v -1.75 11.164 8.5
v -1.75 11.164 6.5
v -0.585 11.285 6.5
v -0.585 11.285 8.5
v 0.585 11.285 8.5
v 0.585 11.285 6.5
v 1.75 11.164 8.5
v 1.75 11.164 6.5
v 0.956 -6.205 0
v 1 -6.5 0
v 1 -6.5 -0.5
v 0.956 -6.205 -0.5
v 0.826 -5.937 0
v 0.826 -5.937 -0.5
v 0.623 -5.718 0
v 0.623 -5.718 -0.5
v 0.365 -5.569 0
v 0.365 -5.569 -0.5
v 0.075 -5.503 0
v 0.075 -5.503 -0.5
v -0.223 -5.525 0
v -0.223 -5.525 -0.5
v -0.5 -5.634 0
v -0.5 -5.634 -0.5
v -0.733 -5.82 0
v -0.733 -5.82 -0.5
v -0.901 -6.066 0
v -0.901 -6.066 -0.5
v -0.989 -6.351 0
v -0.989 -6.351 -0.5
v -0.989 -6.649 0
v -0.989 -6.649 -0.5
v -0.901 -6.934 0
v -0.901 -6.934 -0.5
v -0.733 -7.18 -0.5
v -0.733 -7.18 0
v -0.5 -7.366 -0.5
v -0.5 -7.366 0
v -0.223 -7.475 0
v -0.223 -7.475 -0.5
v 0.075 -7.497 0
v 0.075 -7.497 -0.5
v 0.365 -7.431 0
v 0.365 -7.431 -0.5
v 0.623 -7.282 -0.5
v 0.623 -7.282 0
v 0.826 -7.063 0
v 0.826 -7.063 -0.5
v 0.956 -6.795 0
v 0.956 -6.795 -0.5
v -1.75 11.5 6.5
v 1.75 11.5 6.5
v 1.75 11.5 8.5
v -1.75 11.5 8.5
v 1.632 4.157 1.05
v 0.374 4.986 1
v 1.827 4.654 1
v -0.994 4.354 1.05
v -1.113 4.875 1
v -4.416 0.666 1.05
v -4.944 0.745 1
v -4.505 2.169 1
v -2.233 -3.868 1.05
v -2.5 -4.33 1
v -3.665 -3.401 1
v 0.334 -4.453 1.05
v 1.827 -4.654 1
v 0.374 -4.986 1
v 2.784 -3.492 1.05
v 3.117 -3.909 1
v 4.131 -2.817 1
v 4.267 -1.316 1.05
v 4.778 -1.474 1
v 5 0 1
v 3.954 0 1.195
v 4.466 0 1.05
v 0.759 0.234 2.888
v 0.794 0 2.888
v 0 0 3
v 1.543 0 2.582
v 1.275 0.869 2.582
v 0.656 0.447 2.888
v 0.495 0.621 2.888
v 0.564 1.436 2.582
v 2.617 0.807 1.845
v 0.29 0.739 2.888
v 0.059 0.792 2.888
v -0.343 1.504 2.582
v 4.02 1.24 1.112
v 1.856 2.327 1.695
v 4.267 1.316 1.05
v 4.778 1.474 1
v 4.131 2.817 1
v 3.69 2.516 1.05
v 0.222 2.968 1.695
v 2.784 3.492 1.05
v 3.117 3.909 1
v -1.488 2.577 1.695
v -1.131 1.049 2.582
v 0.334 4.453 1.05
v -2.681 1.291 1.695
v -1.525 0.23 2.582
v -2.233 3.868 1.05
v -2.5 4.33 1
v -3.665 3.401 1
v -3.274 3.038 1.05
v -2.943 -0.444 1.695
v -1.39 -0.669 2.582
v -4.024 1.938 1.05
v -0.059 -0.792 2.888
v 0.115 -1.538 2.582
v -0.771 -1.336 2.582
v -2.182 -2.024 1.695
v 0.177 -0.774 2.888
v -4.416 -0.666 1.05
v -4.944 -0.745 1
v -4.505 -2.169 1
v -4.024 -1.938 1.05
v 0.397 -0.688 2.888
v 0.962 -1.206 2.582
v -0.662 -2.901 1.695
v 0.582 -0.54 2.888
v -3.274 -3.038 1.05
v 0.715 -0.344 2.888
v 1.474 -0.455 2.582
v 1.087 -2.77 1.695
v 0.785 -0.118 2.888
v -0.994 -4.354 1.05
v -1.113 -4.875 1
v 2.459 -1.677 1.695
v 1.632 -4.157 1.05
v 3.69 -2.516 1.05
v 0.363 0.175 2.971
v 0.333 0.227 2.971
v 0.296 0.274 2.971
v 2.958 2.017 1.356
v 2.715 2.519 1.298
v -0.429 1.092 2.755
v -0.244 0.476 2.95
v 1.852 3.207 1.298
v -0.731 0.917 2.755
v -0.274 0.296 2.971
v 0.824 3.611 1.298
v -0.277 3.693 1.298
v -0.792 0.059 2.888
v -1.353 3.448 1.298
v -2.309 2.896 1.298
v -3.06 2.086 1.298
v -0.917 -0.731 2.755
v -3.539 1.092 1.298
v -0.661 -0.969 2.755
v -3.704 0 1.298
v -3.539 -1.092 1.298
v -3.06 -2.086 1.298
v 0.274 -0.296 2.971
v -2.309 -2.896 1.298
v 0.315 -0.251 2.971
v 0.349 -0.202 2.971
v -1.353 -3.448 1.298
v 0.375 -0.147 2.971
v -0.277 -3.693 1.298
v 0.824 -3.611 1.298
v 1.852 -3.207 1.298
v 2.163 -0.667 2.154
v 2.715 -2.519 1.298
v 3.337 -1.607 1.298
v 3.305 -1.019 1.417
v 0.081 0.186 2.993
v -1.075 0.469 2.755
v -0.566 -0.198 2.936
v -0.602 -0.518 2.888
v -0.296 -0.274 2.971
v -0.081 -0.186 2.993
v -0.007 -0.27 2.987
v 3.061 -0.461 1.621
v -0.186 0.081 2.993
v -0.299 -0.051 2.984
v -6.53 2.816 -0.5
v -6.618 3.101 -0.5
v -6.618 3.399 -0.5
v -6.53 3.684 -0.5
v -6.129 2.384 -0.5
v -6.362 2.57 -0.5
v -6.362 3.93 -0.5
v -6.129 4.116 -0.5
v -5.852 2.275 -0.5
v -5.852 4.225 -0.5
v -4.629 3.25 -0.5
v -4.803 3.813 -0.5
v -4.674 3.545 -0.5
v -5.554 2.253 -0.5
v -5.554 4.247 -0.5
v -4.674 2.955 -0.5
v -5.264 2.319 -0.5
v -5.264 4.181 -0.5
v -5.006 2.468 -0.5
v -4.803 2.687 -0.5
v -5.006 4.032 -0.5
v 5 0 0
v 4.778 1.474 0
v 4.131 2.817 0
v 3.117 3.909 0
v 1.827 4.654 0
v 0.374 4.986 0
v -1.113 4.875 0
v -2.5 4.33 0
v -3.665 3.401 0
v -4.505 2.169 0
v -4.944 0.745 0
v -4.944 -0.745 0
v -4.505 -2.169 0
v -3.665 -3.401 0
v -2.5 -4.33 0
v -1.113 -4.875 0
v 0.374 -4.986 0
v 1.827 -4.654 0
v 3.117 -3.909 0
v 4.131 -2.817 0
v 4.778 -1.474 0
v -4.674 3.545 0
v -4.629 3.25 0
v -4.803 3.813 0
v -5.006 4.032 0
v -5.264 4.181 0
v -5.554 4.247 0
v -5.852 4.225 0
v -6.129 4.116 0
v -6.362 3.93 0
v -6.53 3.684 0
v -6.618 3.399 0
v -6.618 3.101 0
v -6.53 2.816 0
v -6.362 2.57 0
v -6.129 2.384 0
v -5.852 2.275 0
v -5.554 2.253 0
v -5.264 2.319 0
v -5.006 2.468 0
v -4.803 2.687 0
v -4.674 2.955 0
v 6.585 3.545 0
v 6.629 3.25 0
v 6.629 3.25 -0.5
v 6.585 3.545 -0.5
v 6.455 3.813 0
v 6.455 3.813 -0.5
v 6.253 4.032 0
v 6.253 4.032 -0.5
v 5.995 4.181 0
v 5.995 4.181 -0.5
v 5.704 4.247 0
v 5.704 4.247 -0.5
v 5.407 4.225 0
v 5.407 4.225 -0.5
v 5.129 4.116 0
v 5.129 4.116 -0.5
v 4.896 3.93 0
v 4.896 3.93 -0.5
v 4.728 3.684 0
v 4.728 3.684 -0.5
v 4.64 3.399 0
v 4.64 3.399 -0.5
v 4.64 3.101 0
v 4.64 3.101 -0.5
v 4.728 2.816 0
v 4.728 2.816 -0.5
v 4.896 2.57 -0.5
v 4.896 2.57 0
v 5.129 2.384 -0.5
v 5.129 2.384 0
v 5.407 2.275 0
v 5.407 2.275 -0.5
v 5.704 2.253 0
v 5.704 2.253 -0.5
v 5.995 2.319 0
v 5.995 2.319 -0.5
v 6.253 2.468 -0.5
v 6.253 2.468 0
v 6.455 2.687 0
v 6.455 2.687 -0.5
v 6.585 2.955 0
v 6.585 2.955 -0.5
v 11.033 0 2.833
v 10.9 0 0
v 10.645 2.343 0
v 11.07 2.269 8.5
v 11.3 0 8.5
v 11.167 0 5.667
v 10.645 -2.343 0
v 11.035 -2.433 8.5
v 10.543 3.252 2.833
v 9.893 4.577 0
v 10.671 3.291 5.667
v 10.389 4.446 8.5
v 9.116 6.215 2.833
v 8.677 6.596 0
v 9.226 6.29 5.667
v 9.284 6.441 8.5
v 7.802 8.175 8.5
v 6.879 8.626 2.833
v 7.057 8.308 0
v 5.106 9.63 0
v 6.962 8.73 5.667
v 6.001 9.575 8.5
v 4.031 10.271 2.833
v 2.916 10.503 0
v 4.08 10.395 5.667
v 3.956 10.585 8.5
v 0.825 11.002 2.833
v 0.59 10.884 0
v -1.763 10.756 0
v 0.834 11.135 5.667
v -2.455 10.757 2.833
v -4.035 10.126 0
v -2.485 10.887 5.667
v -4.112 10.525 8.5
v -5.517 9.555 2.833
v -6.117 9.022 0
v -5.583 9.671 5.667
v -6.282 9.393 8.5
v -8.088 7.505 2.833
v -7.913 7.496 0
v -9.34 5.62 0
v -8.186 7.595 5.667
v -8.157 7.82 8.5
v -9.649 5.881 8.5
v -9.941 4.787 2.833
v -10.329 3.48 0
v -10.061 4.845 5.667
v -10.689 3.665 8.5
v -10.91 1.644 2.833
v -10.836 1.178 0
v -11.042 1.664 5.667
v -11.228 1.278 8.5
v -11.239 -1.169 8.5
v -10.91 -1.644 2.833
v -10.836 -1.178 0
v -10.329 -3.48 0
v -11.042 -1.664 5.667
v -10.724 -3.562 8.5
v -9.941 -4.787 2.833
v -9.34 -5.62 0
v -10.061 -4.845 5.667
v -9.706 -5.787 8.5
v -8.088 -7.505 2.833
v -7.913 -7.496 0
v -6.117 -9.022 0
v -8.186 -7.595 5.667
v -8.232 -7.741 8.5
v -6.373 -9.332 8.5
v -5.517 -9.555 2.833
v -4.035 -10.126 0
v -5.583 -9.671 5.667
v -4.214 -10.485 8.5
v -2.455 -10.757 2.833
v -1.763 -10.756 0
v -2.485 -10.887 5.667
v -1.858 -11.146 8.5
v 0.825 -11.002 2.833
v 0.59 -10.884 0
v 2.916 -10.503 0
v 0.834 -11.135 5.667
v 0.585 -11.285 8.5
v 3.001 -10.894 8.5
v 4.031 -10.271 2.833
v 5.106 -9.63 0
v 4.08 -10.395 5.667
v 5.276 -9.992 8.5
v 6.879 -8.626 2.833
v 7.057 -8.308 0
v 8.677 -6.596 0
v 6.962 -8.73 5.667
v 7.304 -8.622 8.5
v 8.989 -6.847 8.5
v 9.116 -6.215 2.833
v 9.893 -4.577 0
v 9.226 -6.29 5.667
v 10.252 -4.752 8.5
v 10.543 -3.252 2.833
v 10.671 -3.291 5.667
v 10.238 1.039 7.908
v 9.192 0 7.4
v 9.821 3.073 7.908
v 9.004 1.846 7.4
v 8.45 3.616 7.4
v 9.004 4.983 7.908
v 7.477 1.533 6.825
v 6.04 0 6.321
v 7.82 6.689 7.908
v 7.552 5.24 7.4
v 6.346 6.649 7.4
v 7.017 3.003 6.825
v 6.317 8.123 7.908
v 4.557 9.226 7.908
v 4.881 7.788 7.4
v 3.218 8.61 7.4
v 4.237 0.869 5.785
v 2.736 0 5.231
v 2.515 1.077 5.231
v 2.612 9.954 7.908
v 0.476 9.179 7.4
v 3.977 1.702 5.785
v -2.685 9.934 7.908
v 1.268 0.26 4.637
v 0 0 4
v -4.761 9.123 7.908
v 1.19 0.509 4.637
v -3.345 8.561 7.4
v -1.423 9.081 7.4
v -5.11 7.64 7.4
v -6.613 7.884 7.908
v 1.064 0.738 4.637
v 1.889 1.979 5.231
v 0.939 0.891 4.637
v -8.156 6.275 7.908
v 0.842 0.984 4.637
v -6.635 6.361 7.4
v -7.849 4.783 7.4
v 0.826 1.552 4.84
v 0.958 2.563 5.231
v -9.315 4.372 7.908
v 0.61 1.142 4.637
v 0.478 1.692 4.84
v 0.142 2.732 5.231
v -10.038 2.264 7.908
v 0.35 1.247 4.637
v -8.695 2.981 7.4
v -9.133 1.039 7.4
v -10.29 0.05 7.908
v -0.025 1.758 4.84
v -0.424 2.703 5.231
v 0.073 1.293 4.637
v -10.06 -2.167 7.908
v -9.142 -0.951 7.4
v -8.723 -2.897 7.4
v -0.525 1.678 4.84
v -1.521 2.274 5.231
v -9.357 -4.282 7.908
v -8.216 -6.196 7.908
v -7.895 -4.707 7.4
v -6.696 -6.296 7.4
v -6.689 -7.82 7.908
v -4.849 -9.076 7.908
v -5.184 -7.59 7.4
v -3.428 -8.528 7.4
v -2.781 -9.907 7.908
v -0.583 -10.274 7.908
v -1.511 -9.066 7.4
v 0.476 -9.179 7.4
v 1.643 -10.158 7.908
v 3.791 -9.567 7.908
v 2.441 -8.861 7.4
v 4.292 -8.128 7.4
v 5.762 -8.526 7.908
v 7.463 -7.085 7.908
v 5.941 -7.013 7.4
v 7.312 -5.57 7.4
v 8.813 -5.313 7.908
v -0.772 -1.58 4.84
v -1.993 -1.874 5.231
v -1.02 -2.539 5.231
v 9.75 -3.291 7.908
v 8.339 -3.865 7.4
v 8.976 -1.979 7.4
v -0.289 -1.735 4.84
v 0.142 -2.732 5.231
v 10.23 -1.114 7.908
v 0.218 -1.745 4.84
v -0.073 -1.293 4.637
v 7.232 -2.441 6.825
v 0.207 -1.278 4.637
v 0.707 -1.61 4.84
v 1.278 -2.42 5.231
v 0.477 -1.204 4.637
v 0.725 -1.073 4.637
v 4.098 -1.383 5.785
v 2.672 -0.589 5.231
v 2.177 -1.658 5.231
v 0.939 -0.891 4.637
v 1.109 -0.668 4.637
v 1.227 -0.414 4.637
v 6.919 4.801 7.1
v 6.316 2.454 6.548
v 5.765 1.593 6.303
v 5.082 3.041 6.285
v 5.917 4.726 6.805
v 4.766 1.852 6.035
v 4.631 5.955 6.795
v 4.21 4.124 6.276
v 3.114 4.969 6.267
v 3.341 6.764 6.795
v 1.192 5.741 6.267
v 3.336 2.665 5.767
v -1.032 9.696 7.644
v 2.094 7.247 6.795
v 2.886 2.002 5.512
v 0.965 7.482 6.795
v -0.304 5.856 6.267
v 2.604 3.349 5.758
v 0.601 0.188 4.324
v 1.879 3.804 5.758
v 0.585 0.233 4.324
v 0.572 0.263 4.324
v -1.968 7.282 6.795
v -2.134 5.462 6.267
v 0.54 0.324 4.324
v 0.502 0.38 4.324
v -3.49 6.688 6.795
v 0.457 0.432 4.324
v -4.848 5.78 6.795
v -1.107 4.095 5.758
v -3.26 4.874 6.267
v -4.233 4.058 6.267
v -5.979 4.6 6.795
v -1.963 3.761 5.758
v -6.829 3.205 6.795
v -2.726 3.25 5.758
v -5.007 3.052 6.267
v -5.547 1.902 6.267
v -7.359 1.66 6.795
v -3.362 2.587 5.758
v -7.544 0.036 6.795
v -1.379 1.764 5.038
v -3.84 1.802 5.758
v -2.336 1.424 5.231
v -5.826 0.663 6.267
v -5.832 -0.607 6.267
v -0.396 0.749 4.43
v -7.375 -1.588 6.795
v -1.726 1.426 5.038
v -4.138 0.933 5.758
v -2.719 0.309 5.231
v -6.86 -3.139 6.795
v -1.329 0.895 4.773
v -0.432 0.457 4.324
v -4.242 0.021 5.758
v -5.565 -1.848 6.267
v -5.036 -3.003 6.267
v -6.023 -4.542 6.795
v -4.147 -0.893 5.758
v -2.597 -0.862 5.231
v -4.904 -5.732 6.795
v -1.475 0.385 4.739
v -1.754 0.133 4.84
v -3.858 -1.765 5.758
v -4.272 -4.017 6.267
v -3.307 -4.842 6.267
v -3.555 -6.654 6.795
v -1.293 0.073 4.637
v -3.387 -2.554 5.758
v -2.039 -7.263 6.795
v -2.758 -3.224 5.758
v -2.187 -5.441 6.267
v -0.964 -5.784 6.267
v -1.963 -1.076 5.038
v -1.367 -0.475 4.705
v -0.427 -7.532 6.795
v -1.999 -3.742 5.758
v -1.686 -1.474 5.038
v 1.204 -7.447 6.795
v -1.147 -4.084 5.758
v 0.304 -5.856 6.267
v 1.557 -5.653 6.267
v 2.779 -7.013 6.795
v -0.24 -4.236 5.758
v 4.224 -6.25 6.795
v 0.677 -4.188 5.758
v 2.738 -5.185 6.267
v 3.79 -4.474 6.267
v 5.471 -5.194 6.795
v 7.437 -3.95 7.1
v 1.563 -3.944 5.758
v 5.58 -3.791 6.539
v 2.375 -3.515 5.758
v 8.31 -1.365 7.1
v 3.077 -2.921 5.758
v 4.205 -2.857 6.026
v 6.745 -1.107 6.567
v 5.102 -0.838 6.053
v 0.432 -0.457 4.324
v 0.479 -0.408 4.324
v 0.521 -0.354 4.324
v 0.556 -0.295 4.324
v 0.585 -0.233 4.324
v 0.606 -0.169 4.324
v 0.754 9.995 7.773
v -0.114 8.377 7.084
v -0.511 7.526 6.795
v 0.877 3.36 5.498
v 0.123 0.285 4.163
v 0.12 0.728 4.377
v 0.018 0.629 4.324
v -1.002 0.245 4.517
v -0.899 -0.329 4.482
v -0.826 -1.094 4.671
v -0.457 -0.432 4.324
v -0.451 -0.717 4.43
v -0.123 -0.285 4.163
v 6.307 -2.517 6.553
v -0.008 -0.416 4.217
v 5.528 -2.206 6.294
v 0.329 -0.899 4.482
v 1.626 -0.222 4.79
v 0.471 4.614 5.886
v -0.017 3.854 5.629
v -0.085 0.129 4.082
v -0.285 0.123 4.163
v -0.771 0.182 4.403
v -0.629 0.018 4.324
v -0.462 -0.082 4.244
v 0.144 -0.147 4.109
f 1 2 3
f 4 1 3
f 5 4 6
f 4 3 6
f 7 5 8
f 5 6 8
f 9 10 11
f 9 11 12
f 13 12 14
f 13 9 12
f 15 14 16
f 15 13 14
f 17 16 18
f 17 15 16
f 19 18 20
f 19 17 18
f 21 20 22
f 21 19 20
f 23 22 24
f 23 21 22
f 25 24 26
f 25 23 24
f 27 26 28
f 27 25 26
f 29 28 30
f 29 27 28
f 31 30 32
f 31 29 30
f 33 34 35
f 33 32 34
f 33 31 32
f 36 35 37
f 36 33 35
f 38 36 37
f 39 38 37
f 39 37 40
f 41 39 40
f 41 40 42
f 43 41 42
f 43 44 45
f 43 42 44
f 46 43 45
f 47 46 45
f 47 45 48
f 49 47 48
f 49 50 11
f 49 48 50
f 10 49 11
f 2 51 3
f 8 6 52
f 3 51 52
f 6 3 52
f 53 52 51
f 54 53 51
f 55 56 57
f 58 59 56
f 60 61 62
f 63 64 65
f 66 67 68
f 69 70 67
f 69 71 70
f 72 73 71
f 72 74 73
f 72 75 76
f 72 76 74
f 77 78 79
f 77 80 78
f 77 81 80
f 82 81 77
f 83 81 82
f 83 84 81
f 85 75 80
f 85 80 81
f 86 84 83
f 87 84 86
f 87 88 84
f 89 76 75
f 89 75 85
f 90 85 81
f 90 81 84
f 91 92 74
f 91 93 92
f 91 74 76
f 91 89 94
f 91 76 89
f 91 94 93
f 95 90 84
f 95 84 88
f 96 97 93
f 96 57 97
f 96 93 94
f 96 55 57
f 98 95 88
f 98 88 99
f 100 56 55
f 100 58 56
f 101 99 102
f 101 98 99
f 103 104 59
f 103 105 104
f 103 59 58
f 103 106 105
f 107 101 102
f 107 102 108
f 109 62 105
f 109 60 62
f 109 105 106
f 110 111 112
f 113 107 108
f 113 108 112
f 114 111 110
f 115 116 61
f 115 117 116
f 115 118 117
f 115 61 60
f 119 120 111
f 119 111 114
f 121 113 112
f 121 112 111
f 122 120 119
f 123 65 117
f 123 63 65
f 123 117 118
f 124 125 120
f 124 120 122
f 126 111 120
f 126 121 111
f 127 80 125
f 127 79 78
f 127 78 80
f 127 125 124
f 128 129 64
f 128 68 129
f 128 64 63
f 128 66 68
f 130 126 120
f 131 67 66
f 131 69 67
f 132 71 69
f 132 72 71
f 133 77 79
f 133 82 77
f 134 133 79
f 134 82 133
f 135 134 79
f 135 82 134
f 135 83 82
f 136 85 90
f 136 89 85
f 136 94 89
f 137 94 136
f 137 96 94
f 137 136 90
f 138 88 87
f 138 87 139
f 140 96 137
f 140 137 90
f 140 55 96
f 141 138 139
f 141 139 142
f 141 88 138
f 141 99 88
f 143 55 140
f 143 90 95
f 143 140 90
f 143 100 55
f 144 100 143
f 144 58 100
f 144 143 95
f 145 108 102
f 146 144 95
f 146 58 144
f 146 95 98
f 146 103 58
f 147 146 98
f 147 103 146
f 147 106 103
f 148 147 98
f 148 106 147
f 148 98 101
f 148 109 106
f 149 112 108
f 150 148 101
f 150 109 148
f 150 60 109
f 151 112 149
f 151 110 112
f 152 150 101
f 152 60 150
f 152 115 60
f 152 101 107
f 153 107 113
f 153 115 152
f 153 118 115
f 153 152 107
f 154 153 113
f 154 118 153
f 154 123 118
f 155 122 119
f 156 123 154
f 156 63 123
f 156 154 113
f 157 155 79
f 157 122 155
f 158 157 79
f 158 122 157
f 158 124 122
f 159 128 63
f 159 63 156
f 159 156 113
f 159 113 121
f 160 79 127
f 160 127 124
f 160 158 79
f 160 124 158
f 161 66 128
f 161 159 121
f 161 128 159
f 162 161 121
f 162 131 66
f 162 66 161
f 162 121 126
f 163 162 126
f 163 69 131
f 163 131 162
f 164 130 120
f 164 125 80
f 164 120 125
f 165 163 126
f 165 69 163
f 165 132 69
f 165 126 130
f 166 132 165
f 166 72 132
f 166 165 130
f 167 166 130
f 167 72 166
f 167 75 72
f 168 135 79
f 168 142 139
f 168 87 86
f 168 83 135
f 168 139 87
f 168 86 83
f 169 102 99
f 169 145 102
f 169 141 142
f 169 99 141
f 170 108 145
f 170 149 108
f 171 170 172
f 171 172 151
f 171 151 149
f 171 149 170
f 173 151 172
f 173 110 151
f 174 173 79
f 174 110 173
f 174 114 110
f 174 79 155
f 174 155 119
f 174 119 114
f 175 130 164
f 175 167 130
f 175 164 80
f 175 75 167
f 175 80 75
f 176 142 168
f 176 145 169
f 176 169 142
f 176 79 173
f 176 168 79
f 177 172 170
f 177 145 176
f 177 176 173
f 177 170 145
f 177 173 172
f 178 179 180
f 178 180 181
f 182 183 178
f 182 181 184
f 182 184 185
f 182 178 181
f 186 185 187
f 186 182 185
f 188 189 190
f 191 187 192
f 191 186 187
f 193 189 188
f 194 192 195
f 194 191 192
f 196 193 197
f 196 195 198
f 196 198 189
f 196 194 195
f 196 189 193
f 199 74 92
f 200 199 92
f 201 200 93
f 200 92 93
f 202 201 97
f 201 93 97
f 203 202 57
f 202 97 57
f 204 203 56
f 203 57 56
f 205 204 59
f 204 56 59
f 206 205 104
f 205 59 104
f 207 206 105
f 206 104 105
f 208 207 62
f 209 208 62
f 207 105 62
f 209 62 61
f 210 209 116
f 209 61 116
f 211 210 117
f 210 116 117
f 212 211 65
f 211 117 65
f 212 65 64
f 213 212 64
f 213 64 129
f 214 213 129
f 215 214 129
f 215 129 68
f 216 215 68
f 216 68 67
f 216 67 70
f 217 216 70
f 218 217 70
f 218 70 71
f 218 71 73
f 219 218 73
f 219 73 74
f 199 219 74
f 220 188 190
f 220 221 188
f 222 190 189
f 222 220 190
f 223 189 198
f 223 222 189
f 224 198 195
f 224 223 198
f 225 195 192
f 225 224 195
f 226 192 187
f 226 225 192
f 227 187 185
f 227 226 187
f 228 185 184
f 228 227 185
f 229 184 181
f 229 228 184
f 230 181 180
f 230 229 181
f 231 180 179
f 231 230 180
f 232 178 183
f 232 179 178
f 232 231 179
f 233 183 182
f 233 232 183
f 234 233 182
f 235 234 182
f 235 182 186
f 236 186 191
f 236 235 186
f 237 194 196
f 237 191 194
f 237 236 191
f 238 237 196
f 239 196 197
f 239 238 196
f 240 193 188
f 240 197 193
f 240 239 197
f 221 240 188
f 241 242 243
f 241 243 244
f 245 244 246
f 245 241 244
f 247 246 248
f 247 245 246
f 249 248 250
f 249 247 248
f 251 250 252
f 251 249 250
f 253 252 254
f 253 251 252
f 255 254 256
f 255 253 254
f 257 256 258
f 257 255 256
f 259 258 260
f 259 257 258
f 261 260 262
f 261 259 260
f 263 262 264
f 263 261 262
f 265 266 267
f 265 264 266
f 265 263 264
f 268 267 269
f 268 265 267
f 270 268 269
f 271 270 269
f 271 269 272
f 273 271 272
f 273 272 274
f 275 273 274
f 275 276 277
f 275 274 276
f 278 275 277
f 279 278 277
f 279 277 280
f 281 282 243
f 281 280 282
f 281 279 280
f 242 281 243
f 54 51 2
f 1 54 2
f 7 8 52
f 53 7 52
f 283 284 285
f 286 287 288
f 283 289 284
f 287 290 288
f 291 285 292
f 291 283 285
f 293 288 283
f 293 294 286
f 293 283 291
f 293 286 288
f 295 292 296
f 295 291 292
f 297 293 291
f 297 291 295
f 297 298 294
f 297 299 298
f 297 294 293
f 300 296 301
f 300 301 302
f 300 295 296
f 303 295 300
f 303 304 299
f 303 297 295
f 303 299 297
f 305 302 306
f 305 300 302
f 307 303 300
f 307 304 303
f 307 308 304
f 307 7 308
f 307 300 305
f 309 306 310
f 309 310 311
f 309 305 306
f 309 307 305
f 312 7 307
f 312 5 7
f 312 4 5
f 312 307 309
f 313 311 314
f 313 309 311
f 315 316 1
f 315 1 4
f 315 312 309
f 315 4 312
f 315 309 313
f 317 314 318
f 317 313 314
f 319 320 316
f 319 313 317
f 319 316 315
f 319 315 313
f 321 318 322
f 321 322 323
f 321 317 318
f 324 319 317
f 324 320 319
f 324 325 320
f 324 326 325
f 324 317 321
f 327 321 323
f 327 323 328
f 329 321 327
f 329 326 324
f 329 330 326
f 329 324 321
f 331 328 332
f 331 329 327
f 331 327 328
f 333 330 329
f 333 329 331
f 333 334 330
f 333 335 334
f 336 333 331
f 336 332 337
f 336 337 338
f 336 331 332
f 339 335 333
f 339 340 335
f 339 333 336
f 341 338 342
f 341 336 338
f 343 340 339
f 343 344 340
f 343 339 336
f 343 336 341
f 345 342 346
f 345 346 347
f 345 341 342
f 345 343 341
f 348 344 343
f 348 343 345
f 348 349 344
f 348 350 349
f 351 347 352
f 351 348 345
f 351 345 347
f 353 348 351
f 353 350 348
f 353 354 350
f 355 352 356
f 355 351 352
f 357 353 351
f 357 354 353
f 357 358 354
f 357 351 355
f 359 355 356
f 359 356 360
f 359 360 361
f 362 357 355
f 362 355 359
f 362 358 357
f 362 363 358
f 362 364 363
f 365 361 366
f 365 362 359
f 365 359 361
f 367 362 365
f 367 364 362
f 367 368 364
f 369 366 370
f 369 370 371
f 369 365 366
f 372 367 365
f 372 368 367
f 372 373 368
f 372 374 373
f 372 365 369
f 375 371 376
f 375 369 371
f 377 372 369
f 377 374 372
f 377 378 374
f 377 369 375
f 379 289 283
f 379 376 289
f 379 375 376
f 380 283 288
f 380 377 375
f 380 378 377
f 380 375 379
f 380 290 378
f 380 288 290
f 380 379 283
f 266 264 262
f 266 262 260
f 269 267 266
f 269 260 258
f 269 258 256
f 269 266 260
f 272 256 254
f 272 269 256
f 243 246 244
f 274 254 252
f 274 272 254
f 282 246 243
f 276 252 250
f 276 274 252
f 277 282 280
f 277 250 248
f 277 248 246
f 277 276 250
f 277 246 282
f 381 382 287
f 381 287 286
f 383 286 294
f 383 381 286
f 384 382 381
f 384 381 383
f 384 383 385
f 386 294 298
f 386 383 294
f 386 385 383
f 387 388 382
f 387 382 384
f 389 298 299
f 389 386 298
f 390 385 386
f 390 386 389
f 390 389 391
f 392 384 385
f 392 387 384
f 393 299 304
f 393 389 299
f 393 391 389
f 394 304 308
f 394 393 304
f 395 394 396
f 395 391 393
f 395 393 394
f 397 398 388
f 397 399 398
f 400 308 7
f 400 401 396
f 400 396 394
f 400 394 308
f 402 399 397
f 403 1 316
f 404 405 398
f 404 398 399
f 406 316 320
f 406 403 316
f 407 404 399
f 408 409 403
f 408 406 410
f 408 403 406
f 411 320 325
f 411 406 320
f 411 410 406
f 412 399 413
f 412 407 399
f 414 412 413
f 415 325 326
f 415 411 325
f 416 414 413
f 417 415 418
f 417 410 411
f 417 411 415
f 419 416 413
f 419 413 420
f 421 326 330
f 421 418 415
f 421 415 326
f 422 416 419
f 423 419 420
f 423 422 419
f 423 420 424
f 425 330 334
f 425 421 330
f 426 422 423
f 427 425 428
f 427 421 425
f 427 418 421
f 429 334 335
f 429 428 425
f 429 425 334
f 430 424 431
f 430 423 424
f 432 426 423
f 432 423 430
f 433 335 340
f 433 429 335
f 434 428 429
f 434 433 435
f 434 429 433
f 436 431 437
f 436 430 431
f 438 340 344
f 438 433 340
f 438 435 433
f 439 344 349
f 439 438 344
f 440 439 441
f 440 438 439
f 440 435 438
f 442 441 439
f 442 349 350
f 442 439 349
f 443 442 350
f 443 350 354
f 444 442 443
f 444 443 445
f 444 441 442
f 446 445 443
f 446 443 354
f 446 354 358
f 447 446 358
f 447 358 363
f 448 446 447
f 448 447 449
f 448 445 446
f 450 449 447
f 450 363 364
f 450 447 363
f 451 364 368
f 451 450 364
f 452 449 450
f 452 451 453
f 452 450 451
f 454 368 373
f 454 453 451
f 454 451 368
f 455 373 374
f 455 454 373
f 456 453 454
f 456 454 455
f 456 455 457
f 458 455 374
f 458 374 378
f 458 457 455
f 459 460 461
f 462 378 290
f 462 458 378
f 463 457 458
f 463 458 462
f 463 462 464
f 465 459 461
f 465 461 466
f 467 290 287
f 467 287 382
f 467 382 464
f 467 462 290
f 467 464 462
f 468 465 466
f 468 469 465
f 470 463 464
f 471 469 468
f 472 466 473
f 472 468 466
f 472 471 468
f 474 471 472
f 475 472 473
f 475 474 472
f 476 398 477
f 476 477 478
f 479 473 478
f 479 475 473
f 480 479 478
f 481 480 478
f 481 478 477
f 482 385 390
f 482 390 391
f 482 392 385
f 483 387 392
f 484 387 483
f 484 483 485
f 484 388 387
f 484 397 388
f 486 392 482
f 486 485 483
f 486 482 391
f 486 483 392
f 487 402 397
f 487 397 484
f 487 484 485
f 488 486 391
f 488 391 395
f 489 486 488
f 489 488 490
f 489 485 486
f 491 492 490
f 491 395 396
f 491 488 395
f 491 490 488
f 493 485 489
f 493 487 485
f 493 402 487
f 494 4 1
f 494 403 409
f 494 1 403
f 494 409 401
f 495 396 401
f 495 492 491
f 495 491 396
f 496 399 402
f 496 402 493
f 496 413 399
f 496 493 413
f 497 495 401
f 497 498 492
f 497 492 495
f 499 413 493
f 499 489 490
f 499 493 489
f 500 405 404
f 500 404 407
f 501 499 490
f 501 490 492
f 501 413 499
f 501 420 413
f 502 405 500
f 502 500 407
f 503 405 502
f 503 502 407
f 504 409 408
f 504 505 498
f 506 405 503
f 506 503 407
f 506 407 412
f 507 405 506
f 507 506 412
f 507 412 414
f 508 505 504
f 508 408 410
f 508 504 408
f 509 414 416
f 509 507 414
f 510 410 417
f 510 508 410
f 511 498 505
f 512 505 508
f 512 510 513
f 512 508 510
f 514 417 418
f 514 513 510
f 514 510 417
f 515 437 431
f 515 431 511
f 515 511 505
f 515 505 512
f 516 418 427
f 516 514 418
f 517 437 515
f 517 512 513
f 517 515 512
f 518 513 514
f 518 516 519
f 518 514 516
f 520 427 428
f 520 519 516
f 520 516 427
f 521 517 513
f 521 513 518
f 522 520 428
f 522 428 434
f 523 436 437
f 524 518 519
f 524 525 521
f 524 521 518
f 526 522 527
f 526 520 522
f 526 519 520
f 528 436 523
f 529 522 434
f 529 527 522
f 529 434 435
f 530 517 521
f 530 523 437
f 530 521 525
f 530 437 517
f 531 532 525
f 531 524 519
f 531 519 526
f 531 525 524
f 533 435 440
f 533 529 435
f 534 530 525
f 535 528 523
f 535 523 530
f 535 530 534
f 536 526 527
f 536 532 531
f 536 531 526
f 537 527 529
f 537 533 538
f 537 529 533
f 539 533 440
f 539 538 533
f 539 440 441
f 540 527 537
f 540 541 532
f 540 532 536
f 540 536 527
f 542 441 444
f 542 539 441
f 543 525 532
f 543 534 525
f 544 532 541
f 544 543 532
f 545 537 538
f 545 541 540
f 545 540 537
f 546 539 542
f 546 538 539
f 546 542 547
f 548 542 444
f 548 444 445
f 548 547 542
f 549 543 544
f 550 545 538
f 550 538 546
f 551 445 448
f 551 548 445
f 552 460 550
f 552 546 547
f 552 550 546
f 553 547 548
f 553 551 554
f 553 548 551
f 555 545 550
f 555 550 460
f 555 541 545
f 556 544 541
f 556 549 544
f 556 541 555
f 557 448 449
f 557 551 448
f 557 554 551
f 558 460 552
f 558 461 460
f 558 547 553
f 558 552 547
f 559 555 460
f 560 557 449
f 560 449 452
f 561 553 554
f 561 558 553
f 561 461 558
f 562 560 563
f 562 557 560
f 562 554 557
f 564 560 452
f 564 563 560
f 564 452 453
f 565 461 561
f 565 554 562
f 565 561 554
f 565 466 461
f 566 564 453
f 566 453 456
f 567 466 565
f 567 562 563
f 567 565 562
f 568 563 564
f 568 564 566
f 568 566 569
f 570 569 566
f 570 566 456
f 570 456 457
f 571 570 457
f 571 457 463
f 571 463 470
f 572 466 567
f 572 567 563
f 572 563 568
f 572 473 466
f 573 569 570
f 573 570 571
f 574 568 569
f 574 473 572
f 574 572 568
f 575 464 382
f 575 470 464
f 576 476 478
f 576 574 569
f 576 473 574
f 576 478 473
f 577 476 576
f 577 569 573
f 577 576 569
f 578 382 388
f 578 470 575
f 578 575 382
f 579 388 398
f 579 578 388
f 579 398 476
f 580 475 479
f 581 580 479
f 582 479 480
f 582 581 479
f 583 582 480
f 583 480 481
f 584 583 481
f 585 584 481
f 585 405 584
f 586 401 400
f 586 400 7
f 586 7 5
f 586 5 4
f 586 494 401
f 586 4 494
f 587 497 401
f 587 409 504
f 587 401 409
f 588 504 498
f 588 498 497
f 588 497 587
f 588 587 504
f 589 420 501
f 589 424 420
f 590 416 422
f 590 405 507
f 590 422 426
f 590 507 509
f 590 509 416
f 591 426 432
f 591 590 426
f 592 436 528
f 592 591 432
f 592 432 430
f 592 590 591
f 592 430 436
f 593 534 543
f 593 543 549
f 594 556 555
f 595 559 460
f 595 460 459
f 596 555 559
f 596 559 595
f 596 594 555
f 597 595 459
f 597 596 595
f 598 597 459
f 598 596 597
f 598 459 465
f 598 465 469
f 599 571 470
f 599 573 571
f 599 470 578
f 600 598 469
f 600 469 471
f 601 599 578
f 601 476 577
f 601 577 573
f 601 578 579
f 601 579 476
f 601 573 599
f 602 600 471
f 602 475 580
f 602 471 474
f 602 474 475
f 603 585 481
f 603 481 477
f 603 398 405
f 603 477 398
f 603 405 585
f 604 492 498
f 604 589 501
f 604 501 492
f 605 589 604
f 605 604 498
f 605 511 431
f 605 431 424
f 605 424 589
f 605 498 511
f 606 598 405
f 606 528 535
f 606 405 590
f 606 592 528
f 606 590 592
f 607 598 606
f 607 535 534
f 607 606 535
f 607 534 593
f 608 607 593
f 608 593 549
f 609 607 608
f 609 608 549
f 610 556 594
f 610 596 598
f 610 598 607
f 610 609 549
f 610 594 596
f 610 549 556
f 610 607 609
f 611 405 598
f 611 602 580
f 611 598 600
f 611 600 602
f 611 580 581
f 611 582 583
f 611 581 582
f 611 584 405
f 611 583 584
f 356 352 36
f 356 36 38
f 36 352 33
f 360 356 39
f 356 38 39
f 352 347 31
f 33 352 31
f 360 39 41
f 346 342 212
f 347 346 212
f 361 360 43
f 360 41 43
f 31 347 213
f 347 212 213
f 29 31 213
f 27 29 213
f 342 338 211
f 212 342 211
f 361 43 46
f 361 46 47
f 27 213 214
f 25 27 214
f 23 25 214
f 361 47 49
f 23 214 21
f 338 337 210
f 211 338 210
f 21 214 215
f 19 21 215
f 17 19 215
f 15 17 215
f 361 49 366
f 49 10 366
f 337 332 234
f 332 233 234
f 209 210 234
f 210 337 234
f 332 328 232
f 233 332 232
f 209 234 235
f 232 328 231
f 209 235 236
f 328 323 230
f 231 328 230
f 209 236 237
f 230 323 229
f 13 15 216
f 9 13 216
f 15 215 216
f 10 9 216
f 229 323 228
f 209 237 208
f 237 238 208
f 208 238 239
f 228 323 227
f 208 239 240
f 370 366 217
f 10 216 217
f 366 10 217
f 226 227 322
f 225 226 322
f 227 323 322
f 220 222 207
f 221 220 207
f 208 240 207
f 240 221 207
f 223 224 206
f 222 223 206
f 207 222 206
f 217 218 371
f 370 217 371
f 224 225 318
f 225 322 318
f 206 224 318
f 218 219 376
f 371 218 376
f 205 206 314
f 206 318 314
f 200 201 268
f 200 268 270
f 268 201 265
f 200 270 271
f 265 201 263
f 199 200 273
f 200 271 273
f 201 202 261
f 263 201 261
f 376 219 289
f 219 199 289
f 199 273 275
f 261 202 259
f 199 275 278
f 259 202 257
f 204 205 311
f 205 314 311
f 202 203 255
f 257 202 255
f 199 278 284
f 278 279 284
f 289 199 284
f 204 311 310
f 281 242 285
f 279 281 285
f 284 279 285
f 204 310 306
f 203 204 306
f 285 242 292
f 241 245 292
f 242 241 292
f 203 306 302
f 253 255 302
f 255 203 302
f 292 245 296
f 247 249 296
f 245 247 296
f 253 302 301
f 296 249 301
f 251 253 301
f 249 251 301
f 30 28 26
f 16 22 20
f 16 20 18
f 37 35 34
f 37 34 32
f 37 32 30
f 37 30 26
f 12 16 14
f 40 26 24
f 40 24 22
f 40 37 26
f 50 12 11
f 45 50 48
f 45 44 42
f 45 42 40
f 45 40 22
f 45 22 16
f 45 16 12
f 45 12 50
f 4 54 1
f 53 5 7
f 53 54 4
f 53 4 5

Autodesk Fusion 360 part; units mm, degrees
sketch "Sketch2" plane through (0, 0, 0) normal (0, 1, 0) x (1, 0, 0)
  line L0 (5, 0) -> (10.9, 0)
  line L1 (10.9, 0) -> (11.3, -8.5)
  line L2 (5, 0) -> (5, -1)
  spline S0 degree 5 poles (0, -3) (0.1093, -3) (0.3255, -2.9898) (0.6427, -2.9438) (1.0521, -2.8244) (1.5455, -2.5961) (2.026, -2.3122) (2.5, -2) (2.974, -1.6878) (3.4545, -1.4039) (3.9479, -1.1756) (4.3573, -1.0562) (4.6745, -1.0102) (4.8907, -1) (5, -1) knots 0 0 0 0 0 0 0.1 0.2 0.3 0.4 0.5 0.6 0.7 0.8 0.9 1 1 1 1 1 1
  line L3 (-0.5, -3) -> (0.5, -3)
  line L4 (4.5, -1) -> (5.5, -1)
  line L5 (0, -4) -> (0, -3)
  spline S1 degree 5 poles (11.3, -8.5) (11.0966, -8.3649) (10.6784, -8.1051) (10.0171, -7.7462) (9.0733, -7.3253) (7.8236, -6.8745) (6.5466, -6.4725) (5.2853, -6.0927) (4.0759, -5.7126) (2.9377, -5.3182) (1.8767, -4.9032) (1.0893, -4.5531) (0.5319, -4.2804) (0.1749, -4.0942) (0, -4) knots 0 0 0 0 0 0 0.1 0.2 0.3 0.4 0.5 0.6 0.7 0.8 0.9 1 1 1 1 1 1
  line L6 (12.422, -9.2449) -> (10.178, -7.7551)
  point P0 (2.5, -2)
  point P1 (5, -6)
  dimension "d2" = 10.9
  dimension "d5" = 11.3
  dimension "d7" = 1
  dimension "d14" = 3
  dimension "d15" = 4
revolve "Revolve1" add sketch "Sketch2" angle 360 about axis through (0, 0, 1.75) along (0, 0, 1)
sketch "Sketch3" plane through (0, 0, 0) normal (0, 0, -1) x (1, 0, 0)
  circle A0 centre (0, 0) radius 5
  circle A1 centre (0, 0) radius 10.9
  circle A2 centre (0, 6.5) radius 1
  circle A3 centre (-5.6292, -3.25) radius 1
  circle A4 centre (5.6292, -3.25) radius 1
  dimension "d9" = 2
  dimension "d11" = 360
extrude "Extrude1" add sketch "Sketch3" along normal blind 0.5 contours A2 | A3 | A4
sketch "Sketch4" plane through (0, 0, 0) normal (0, 0, 1) x (1, 0, 0)
  line L0 (-1.75, 11.1) -> (1.75, 11.1)
  line L1 (1.75, 11.1) -> (1.75, 11.5)
  line L2 (1.75, 11.5) -> (-1.75, 11.5)
  line L3 (-1.75, 11.5) -> (-1.75, 11.1)
  circle A0 centre (0, 0) radius 11.3
  dimension "d16" = 3.5
  dimension "d17" = 1.75
  dimension "d18" = 11.5
extrude "Extrude2" add sketch "Sketch4" along normal blind 2 from surface at 6.5 contours L1 L2 L3 A0
equation "d2 = ( 21.8 / 2 ) * 1 mm"
equation "d5 = ( 22.6 / 2 ) * 1 mm"
equation "d17 = ( 3.5 / 2 ) * 1 mm"
equation "d18 = ( 23 / 2 ) * 1 mm"
